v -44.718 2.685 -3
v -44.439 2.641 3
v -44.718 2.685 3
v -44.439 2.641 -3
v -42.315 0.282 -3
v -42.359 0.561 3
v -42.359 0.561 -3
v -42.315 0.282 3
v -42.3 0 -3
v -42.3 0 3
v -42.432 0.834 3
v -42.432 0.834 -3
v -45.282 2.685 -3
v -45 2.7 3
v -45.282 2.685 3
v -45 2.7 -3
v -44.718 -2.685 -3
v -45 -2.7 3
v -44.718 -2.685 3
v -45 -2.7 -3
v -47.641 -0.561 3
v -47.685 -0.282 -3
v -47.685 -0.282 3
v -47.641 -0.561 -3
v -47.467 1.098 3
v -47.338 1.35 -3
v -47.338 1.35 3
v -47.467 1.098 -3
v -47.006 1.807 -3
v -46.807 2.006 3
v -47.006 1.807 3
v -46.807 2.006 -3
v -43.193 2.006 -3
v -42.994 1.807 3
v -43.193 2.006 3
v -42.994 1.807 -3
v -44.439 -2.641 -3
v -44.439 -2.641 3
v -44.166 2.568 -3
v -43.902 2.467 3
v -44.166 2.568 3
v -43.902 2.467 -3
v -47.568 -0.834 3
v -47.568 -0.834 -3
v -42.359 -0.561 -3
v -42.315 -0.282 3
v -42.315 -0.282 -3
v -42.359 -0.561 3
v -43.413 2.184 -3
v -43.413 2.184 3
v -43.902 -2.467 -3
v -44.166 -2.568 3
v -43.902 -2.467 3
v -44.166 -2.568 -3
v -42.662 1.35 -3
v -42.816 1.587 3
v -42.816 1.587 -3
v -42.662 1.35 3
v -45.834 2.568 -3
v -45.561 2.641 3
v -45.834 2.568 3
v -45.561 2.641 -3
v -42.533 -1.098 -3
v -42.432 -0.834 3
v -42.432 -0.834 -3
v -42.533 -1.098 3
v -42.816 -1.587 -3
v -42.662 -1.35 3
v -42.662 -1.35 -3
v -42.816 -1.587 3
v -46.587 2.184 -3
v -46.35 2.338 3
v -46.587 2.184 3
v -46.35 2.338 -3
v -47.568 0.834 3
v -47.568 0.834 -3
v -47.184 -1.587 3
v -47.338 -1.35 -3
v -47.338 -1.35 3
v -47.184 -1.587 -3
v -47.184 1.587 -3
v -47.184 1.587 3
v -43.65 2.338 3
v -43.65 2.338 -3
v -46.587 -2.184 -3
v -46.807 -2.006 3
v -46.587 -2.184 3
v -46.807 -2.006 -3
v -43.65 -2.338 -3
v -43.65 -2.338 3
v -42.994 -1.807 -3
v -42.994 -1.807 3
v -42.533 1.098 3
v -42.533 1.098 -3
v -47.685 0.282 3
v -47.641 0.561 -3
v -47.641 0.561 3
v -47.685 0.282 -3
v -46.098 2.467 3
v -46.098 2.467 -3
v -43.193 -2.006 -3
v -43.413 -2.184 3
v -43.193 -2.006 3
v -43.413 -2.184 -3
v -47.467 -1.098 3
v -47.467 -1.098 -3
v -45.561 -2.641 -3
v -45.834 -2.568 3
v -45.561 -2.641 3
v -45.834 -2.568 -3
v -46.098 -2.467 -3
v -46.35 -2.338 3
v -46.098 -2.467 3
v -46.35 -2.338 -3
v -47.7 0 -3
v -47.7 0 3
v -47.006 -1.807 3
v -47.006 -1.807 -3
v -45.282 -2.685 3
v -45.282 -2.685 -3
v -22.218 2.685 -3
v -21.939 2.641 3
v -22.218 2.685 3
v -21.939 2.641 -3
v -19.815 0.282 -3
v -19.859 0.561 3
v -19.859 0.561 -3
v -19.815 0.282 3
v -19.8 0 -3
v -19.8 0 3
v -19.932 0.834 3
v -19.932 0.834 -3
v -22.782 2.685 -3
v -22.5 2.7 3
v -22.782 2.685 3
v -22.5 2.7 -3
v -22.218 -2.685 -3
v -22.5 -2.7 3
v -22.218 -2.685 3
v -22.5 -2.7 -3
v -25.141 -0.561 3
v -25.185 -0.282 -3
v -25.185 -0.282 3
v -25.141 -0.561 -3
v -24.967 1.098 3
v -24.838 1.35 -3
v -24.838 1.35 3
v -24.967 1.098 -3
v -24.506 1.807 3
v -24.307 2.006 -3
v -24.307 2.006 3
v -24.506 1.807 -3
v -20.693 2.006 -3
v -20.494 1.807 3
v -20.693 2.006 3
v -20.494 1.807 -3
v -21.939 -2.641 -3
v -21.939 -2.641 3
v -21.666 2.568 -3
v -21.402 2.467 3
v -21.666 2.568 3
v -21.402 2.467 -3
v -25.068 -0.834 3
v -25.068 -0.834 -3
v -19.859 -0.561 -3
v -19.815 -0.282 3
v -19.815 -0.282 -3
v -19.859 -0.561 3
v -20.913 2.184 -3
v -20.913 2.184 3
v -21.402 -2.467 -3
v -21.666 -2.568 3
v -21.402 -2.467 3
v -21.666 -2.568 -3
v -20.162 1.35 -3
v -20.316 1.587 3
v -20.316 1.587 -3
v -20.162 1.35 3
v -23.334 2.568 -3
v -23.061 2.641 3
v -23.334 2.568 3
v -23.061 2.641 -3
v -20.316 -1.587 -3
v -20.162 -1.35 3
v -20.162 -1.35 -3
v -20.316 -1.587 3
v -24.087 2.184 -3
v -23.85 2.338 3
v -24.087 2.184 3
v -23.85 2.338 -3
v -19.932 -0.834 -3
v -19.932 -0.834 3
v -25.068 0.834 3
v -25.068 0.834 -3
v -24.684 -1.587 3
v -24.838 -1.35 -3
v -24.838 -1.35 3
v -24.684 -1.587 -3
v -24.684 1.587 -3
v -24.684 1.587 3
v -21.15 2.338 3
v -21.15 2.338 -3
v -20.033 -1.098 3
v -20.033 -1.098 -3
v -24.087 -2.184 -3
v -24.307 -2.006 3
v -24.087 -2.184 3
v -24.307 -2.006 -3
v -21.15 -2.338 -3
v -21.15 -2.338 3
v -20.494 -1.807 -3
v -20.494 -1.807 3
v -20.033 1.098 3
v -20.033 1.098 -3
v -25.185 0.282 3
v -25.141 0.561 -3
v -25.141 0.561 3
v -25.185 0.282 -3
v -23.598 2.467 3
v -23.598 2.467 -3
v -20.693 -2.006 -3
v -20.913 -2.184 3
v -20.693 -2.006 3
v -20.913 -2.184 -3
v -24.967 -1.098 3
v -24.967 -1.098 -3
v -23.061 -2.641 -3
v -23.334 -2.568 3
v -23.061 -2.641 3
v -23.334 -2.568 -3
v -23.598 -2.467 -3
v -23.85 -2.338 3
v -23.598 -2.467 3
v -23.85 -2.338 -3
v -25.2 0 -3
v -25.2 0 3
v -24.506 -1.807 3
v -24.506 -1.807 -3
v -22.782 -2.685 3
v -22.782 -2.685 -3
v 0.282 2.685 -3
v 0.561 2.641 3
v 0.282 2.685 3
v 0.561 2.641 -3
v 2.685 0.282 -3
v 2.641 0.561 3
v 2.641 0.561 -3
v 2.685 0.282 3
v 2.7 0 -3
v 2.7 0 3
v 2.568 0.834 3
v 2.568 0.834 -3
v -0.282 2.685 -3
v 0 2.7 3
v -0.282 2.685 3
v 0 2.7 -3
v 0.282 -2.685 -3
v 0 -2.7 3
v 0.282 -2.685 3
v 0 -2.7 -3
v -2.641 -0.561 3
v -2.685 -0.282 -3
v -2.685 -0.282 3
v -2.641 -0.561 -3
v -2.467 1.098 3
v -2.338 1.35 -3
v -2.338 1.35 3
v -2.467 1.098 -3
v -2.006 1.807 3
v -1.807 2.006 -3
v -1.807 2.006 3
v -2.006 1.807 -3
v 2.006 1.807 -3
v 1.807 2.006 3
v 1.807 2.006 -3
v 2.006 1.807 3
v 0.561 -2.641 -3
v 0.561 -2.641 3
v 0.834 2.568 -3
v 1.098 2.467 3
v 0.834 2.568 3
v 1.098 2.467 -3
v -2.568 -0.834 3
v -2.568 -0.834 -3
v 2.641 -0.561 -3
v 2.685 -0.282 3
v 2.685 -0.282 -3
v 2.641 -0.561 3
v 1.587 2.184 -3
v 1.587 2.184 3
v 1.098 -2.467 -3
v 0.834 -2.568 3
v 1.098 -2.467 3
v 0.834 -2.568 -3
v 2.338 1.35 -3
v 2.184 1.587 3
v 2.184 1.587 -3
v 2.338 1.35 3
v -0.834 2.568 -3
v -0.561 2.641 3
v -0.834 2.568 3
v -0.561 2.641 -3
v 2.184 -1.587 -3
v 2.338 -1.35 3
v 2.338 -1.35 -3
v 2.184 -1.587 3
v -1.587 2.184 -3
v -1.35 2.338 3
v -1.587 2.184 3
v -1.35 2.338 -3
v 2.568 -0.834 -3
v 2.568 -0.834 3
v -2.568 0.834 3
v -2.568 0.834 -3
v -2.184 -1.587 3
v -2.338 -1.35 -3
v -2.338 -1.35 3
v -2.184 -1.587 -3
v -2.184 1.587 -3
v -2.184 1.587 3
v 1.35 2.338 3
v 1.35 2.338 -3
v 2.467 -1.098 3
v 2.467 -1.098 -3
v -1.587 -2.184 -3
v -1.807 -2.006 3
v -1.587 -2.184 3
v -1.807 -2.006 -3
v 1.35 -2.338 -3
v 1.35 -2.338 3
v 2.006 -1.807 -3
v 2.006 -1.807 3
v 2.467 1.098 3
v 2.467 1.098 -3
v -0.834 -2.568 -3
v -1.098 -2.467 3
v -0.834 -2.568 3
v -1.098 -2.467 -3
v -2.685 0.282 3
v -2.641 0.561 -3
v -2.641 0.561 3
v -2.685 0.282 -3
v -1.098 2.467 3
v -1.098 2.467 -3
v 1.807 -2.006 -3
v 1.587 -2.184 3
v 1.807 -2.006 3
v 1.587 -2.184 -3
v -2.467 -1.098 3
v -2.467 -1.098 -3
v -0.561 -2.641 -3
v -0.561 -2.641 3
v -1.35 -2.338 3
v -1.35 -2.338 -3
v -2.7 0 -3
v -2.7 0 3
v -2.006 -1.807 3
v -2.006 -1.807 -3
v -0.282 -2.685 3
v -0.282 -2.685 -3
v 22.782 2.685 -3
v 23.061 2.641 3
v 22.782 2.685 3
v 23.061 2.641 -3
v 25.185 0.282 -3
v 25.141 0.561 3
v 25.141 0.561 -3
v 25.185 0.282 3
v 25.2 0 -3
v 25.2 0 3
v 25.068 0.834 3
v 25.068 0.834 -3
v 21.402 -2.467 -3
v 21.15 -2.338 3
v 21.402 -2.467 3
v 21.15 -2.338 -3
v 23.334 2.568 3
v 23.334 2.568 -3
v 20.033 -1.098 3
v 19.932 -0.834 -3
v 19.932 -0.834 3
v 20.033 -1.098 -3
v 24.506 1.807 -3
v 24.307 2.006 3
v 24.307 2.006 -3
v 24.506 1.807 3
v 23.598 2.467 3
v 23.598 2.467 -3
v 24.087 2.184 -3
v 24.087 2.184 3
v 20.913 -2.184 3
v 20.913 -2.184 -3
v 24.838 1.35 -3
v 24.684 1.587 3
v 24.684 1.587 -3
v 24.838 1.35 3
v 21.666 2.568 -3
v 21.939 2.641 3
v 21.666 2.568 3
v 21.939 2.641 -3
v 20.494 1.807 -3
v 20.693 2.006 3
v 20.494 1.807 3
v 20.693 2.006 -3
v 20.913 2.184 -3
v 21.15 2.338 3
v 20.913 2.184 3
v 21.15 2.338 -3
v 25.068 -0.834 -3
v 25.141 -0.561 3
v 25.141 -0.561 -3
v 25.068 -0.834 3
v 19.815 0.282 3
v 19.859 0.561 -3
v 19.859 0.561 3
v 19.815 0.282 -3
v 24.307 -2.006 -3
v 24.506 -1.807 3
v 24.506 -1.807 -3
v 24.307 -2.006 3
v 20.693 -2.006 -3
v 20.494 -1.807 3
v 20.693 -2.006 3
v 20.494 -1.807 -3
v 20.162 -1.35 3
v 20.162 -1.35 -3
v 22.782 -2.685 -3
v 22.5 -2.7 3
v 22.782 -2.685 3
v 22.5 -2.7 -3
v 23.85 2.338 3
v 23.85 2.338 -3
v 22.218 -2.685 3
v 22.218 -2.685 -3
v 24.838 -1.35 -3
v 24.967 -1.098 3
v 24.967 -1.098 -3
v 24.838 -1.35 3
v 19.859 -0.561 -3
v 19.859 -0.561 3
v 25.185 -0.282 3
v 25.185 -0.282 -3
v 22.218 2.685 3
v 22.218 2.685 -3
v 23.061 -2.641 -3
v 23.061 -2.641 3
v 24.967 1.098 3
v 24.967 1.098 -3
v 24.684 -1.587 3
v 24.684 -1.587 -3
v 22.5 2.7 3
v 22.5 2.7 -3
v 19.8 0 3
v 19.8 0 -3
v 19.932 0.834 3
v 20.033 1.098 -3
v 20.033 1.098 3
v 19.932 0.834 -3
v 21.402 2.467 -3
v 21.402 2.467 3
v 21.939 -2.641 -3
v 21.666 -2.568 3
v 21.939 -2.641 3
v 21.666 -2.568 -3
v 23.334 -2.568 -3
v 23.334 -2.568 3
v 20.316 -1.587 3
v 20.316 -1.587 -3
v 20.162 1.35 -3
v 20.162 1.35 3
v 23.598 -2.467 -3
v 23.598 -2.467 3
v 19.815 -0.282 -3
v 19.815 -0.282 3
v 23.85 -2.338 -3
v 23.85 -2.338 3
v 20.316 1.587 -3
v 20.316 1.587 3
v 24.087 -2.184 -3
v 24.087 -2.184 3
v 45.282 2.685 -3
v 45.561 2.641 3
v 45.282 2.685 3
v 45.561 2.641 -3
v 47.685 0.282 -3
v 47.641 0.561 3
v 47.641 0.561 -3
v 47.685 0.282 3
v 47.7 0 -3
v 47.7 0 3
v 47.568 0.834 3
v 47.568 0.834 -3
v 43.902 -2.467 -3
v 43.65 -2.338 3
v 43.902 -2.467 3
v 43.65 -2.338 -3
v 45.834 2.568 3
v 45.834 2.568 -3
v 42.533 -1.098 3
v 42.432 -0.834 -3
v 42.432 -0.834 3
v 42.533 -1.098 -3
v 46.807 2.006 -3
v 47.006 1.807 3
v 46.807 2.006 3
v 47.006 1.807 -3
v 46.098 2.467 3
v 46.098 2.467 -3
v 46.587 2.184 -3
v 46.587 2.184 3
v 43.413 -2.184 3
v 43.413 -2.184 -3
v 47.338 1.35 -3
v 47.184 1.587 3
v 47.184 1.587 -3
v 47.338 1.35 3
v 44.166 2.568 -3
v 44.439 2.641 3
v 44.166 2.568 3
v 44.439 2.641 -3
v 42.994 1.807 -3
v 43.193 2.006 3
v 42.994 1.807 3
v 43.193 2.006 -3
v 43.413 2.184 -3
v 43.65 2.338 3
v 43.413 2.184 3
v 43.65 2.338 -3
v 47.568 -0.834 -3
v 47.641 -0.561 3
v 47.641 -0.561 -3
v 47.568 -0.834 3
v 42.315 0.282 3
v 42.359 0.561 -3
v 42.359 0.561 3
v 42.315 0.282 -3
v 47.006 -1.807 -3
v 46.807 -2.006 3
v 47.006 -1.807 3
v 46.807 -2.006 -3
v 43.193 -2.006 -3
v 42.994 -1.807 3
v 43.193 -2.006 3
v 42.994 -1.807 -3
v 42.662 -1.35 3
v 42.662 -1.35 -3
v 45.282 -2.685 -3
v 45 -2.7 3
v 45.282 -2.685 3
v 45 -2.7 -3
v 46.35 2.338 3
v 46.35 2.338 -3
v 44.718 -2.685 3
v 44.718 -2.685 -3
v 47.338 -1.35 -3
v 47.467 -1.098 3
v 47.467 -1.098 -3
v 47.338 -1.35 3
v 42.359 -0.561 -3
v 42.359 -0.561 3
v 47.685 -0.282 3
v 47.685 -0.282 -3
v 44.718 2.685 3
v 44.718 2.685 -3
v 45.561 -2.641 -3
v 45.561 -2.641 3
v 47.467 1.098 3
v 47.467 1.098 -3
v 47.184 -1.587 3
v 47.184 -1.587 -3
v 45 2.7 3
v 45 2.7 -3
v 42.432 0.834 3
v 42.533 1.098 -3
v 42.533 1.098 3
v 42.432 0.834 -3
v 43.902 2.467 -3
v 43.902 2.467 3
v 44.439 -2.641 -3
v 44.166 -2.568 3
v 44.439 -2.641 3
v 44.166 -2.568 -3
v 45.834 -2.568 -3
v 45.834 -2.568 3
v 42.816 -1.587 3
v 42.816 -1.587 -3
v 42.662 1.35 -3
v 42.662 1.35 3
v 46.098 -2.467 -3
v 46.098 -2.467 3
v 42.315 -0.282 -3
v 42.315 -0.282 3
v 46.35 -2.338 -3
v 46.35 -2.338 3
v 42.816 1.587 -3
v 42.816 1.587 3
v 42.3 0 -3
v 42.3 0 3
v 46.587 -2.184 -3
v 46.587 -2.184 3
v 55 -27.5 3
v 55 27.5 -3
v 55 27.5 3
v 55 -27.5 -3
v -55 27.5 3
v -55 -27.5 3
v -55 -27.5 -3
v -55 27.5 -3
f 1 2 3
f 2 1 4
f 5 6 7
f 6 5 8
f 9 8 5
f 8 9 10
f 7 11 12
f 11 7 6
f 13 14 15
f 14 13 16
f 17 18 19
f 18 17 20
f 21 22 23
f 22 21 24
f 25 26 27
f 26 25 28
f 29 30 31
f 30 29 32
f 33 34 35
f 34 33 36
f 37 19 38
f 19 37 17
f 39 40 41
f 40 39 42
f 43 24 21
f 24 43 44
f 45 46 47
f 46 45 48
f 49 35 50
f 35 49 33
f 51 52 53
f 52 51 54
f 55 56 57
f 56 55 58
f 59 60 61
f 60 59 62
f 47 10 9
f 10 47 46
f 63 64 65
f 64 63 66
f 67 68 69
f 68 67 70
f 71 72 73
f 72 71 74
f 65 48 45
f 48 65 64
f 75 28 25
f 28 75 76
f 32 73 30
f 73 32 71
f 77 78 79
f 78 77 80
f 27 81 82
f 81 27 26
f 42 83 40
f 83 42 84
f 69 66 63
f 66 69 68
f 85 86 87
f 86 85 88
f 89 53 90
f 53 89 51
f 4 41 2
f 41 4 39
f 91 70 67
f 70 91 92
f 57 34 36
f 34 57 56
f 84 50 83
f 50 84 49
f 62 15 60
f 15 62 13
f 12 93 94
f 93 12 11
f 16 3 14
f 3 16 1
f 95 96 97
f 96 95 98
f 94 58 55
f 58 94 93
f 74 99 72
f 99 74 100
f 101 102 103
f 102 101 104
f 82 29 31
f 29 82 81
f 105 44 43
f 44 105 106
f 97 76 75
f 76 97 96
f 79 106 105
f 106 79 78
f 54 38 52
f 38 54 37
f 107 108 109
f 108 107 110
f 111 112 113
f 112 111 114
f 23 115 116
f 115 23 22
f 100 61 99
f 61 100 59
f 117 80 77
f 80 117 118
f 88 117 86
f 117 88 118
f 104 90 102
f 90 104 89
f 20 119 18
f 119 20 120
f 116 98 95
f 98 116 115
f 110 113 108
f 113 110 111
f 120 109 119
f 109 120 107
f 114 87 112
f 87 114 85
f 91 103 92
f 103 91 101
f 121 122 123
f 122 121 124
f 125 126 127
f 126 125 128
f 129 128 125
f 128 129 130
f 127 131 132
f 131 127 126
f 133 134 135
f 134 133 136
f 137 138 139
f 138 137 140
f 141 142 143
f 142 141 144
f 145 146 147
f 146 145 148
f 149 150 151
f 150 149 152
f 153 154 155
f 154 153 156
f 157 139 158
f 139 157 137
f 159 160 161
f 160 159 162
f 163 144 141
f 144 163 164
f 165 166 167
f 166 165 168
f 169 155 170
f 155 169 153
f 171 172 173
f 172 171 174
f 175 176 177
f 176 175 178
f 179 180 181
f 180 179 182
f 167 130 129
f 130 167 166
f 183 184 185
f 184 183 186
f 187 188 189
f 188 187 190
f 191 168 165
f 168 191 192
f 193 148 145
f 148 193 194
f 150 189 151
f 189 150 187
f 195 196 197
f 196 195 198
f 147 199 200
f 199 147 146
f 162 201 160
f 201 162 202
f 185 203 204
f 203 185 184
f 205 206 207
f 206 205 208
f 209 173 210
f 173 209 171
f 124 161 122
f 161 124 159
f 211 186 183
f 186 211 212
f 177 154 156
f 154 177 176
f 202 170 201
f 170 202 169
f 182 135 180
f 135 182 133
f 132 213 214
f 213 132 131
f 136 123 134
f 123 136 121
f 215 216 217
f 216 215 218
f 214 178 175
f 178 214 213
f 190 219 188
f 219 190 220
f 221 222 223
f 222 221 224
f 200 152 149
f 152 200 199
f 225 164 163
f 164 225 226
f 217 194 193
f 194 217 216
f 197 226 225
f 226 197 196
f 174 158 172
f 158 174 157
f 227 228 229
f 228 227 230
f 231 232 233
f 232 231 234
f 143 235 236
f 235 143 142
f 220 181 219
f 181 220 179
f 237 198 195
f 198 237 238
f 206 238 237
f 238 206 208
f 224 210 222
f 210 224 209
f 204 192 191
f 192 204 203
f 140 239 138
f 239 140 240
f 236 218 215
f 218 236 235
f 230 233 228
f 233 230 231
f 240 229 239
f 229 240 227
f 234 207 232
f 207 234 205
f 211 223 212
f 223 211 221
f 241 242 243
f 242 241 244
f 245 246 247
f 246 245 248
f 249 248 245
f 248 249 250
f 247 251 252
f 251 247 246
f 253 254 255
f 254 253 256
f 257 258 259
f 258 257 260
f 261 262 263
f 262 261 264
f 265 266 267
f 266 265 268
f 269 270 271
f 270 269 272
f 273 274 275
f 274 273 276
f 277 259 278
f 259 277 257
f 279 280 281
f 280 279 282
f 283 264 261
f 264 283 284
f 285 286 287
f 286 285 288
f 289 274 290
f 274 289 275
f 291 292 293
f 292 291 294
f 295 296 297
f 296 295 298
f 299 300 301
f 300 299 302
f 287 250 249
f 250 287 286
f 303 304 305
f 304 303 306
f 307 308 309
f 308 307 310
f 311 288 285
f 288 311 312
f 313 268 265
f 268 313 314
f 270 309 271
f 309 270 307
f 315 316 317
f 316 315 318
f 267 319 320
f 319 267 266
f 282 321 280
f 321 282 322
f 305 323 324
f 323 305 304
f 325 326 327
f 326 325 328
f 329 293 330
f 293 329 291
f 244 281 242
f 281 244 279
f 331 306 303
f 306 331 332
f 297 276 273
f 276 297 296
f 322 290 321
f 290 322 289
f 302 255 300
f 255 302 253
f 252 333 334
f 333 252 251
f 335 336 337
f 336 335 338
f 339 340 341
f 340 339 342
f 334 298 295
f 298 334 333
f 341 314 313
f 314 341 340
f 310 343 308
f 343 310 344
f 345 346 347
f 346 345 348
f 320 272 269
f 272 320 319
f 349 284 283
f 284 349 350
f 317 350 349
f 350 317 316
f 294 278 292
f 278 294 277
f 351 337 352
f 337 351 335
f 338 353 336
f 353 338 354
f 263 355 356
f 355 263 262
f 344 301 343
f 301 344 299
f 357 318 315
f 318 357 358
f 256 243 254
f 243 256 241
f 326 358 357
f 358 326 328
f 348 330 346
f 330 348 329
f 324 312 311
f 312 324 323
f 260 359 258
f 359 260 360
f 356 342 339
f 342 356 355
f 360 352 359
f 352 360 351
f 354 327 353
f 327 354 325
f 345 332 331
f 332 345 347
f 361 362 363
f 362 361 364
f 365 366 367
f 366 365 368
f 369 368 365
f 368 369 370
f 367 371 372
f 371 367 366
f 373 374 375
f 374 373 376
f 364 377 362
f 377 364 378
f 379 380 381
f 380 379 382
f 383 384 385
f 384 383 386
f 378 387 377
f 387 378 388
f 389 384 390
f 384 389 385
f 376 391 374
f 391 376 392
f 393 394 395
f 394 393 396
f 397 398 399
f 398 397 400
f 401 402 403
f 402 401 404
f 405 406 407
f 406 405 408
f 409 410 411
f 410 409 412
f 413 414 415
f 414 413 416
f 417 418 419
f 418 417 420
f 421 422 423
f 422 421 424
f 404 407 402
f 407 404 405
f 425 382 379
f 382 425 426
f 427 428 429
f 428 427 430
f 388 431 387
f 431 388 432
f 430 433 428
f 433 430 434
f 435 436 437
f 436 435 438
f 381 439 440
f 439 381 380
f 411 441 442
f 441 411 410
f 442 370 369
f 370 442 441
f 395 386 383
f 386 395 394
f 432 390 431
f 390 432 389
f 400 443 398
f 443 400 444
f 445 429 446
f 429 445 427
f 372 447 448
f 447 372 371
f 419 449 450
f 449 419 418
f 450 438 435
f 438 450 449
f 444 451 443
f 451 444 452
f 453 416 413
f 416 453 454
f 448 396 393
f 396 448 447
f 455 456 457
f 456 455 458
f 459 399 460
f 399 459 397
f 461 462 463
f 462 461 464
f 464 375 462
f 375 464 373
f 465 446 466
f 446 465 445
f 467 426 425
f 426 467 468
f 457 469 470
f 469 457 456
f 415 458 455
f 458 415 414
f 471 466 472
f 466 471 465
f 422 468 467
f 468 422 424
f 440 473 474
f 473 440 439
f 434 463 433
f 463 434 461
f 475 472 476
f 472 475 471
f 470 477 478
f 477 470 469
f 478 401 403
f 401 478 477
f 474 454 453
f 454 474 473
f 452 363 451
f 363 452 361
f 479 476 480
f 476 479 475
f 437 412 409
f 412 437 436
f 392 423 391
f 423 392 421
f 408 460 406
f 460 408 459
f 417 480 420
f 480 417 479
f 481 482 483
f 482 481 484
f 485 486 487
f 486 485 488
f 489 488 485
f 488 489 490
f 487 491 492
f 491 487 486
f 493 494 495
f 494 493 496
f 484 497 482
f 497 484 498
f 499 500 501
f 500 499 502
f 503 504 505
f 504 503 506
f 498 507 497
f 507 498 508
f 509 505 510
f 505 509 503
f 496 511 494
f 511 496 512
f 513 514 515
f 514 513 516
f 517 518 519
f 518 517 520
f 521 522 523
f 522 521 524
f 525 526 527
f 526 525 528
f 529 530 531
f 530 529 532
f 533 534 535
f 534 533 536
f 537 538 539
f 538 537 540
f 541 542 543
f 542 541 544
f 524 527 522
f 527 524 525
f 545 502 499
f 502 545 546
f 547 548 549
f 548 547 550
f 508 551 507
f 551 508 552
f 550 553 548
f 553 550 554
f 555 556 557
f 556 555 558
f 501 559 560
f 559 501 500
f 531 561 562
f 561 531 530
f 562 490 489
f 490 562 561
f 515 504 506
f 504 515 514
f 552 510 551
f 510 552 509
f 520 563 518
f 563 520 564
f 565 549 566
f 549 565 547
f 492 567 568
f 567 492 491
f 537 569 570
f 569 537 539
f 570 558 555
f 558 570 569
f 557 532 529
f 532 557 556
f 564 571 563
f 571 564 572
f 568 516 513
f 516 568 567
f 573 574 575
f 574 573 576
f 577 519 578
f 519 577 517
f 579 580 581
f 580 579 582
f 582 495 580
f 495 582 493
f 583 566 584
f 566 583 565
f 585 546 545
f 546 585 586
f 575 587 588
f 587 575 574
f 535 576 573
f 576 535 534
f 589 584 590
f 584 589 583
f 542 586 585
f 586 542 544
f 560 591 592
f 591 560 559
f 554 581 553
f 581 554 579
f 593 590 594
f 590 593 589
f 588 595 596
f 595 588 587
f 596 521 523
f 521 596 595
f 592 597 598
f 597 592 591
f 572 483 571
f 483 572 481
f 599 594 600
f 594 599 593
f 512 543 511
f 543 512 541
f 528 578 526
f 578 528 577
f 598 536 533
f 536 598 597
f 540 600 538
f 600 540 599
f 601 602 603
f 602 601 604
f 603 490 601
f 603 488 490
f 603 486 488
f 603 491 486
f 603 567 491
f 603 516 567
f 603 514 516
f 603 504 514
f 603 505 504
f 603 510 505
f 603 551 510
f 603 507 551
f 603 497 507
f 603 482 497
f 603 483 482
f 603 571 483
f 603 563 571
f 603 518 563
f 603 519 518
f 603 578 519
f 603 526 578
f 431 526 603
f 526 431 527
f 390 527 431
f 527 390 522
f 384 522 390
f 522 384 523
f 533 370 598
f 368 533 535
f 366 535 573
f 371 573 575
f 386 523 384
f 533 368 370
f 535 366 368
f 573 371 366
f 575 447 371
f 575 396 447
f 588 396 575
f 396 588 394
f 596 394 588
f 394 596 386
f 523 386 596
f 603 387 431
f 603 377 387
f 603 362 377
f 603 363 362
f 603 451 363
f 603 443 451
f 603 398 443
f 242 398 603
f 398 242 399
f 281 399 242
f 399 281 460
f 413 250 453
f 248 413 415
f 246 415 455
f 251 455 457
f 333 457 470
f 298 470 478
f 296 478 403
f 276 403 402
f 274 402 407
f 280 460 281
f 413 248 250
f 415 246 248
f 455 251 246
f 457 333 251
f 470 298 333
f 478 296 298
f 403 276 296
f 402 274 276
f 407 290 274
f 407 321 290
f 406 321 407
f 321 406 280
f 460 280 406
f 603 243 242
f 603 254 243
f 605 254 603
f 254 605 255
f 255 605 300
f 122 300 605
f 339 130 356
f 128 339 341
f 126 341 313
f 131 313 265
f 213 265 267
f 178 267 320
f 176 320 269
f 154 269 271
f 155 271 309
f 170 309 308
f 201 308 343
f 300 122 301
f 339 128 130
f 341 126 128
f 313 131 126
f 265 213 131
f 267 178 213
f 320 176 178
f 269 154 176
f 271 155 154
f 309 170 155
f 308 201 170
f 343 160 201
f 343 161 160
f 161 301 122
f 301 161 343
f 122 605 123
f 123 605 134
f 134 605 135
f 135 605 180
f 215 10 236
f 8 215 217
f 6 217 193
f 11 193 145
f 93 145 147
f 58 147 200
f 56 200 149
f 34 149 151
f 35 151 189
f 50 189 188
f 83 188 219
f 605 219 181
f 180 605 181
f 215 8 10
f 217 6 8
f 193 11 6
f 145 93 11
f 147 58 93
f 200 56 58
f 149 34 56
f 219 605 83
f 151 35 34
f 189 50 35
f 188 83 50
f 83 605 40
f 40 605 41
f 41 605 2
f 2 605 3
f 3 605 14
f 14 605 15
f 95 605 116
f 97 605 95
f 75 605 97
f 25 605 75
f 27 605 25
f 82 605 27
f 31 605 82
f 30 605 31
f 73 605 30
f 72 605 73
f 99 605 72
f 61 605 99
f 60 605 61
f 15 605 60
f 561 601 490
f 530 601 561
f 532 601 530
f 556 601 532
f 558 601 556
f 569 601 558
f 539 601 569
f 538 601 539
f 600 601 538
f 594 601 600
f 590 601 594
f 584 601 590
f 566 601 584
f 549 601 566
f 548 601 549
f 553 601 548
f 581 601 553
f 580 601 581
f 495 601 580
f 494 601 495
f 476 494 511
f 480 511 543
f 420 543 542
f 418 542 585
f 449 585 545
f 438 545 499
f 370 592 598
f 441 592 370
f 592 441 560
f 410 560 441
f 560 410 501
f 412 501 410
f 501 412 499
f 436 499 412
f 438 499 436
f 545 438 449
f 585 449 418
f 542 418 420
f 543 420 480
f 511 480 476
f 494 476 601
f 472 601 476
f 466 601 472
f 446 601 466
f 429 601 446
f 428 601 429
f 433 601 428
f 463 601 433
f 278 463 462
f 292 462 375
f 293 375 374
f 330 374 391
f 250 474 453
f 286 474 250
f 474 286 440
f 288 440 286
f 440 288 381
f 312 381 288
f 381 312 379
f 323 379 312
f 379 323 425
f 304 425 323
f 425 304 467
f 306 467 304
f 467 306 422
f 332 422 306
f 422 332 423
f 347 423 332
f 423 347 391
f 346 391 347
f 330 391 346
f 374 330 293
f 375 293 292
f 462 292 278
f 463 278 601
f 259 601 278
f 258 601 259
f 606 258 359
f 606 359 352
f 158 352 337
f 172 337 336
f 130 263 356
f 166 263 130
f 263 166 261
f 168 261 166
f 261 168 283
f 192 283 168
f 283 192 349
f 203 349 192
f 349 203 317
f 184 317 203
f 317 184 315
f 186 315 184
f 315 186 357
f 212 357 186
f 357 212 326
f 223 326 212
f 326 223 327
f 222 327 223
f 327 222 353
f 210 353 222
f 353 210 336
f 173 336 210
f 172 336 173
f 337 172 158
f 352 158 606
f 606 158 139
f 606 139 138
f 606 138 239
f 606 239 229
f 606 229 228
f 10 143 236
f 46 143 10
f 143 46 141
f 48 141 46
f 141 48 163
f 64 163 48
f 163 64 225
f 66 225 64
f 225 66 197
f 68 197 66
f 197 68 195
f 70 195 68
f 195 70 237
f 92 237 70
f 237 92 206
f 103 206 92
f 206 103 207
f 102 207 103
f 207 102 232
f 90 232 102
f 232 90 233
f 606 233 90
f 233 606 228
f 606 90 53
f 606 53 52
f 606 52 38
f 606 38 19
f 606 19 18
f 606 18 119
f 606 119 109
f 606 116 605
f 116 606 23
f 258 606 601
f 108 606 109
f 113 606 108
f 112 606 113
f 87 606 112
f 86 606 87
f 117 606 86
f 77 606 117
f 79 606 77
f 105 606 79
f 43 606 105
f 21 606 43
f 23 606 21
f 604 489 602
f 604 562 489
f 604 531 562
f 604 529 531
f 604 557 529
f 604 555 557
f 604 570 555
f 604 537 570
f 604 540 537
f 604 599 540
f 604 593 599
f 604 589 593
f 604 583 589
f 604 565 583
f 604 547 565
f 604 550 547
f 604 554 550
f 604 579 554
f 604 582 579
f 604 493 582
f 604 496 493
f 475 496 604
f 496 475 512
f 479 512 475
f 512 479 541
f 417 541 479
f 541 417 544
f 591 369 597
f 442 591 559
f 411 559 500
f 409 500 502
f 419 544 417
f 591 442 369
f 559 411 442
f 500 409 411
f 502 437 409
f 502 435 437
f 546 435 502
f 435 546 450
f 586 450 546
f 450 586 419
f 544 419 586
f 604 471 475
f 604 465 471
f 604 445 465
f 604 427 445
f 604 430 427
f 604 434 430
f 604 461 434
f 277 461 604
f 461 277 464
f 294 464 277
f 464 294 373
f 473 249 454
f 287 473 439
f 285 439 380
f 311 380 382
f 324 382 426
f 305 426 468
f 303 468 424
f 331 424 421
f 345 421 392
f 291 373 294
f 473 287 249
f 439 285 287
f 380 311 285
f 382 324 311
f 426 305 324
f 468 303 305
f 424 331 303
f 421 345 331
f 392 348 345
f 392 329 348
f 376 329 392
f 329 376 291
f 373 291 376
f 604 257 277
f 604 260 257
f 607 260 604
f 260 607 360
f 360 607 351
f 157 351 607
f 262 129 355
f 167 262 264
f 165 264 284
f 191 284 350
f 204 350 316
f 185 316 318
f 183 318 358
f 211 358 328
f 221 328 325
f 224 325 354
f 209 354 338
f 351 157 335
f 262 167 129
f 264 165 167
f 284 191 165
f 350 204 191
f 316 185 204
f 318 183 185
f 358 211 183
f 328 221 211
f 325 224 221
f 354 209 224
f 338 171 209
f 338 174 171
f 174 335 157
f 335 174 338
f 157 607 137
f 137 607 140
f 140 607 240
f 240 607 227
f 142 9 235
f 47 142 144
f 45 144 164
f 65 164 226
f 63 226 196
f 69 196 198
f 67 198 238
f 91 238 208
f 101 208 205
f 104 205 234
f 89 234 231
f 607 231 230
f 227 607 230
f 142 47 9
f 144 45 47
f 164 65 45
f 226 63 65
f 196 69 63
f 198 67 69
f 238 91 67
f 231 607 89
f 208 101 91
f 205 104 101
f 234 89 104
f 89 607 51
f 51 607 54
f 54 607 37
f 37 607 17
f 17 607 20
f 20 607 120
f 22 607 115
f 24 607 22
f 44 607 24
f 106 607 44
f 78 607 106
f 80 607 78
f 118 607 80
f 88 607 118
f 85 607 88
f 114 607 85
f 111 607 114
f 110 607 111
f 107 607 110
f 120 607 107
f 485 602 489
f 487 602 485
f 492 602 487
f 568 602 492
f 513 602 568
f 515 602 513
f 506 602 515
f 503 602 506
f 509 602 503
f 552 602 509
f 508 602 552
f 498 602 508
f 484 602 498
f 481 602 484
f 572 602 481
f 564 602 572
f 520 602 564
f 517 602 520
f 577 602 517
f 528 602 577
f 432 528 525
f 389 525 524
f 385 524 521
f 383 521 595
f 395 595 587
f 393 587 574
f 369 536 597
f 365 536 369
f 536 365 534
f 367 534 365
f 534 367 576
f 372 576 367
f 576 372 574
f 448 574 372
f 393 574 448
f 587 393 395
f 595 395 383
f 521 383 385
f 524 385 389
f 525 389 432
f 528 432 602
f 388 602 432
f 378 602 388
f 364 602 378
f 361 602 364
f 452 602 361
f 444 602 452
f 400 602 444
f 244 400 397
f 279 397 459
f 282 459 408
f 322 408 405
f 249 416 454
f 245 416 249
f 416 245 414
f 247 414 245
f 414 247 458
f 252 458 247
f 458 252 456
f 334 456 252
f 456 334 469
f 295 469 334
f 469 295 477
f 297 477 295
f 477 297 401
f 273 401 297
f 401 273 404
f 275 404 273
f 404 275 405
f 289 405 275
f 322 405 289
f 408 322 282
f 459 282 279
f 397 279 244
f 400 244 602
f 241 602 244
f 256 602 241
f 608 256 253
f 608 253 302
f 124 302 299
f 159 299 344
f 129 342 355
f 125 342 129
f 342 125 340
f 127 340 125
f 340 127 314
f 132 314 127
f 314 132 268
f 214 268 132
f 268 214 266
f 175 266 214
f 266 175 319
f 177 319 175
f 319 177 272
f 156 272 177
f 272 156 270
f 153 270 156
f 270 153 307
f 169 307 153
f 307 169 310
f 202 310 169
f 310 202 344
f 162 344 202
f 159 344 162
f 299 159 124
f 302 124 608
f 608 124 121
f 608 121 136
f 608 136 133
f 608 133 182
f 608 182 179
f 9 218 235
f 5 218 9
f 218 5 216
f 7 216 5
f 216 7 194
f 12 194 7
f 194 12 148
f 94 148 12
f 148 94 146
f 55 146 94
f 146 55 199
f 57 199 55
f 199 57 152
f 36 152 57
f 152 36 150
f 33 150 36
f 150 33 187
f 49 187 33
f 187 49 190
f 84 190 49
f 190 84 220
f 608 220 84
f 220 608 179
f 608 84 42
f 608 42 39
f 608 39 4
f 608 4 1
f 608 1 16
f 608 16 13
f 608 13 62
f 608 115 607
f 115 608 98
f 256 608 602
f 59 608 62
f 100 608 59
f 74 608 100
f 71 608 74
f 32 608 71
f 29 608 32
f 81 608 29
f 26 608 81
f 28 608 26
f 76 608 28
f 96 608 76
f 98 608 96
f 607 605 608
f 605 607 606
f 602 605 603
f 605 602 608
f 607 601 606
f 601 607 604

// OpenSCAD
// Multi-hole mounting plate.
$fn = 60;
eps = 0.02;
plate_l = 110;
plate_w = 55;
plate_t = 6;
hole_d = 5.4;
edge = 10;
difference() {
    cube([plate_l, plate_w, plate_t], center = true);
    for (i = [0 : 4])
        translate([-plate_l / 2 + edge + i * (plate_l - 2 * edge) / max(1, 4), 0, -plate_t / 2 - eps])
            cylinder(d = hole_d, h = plate_t + 2 * eps);
}
